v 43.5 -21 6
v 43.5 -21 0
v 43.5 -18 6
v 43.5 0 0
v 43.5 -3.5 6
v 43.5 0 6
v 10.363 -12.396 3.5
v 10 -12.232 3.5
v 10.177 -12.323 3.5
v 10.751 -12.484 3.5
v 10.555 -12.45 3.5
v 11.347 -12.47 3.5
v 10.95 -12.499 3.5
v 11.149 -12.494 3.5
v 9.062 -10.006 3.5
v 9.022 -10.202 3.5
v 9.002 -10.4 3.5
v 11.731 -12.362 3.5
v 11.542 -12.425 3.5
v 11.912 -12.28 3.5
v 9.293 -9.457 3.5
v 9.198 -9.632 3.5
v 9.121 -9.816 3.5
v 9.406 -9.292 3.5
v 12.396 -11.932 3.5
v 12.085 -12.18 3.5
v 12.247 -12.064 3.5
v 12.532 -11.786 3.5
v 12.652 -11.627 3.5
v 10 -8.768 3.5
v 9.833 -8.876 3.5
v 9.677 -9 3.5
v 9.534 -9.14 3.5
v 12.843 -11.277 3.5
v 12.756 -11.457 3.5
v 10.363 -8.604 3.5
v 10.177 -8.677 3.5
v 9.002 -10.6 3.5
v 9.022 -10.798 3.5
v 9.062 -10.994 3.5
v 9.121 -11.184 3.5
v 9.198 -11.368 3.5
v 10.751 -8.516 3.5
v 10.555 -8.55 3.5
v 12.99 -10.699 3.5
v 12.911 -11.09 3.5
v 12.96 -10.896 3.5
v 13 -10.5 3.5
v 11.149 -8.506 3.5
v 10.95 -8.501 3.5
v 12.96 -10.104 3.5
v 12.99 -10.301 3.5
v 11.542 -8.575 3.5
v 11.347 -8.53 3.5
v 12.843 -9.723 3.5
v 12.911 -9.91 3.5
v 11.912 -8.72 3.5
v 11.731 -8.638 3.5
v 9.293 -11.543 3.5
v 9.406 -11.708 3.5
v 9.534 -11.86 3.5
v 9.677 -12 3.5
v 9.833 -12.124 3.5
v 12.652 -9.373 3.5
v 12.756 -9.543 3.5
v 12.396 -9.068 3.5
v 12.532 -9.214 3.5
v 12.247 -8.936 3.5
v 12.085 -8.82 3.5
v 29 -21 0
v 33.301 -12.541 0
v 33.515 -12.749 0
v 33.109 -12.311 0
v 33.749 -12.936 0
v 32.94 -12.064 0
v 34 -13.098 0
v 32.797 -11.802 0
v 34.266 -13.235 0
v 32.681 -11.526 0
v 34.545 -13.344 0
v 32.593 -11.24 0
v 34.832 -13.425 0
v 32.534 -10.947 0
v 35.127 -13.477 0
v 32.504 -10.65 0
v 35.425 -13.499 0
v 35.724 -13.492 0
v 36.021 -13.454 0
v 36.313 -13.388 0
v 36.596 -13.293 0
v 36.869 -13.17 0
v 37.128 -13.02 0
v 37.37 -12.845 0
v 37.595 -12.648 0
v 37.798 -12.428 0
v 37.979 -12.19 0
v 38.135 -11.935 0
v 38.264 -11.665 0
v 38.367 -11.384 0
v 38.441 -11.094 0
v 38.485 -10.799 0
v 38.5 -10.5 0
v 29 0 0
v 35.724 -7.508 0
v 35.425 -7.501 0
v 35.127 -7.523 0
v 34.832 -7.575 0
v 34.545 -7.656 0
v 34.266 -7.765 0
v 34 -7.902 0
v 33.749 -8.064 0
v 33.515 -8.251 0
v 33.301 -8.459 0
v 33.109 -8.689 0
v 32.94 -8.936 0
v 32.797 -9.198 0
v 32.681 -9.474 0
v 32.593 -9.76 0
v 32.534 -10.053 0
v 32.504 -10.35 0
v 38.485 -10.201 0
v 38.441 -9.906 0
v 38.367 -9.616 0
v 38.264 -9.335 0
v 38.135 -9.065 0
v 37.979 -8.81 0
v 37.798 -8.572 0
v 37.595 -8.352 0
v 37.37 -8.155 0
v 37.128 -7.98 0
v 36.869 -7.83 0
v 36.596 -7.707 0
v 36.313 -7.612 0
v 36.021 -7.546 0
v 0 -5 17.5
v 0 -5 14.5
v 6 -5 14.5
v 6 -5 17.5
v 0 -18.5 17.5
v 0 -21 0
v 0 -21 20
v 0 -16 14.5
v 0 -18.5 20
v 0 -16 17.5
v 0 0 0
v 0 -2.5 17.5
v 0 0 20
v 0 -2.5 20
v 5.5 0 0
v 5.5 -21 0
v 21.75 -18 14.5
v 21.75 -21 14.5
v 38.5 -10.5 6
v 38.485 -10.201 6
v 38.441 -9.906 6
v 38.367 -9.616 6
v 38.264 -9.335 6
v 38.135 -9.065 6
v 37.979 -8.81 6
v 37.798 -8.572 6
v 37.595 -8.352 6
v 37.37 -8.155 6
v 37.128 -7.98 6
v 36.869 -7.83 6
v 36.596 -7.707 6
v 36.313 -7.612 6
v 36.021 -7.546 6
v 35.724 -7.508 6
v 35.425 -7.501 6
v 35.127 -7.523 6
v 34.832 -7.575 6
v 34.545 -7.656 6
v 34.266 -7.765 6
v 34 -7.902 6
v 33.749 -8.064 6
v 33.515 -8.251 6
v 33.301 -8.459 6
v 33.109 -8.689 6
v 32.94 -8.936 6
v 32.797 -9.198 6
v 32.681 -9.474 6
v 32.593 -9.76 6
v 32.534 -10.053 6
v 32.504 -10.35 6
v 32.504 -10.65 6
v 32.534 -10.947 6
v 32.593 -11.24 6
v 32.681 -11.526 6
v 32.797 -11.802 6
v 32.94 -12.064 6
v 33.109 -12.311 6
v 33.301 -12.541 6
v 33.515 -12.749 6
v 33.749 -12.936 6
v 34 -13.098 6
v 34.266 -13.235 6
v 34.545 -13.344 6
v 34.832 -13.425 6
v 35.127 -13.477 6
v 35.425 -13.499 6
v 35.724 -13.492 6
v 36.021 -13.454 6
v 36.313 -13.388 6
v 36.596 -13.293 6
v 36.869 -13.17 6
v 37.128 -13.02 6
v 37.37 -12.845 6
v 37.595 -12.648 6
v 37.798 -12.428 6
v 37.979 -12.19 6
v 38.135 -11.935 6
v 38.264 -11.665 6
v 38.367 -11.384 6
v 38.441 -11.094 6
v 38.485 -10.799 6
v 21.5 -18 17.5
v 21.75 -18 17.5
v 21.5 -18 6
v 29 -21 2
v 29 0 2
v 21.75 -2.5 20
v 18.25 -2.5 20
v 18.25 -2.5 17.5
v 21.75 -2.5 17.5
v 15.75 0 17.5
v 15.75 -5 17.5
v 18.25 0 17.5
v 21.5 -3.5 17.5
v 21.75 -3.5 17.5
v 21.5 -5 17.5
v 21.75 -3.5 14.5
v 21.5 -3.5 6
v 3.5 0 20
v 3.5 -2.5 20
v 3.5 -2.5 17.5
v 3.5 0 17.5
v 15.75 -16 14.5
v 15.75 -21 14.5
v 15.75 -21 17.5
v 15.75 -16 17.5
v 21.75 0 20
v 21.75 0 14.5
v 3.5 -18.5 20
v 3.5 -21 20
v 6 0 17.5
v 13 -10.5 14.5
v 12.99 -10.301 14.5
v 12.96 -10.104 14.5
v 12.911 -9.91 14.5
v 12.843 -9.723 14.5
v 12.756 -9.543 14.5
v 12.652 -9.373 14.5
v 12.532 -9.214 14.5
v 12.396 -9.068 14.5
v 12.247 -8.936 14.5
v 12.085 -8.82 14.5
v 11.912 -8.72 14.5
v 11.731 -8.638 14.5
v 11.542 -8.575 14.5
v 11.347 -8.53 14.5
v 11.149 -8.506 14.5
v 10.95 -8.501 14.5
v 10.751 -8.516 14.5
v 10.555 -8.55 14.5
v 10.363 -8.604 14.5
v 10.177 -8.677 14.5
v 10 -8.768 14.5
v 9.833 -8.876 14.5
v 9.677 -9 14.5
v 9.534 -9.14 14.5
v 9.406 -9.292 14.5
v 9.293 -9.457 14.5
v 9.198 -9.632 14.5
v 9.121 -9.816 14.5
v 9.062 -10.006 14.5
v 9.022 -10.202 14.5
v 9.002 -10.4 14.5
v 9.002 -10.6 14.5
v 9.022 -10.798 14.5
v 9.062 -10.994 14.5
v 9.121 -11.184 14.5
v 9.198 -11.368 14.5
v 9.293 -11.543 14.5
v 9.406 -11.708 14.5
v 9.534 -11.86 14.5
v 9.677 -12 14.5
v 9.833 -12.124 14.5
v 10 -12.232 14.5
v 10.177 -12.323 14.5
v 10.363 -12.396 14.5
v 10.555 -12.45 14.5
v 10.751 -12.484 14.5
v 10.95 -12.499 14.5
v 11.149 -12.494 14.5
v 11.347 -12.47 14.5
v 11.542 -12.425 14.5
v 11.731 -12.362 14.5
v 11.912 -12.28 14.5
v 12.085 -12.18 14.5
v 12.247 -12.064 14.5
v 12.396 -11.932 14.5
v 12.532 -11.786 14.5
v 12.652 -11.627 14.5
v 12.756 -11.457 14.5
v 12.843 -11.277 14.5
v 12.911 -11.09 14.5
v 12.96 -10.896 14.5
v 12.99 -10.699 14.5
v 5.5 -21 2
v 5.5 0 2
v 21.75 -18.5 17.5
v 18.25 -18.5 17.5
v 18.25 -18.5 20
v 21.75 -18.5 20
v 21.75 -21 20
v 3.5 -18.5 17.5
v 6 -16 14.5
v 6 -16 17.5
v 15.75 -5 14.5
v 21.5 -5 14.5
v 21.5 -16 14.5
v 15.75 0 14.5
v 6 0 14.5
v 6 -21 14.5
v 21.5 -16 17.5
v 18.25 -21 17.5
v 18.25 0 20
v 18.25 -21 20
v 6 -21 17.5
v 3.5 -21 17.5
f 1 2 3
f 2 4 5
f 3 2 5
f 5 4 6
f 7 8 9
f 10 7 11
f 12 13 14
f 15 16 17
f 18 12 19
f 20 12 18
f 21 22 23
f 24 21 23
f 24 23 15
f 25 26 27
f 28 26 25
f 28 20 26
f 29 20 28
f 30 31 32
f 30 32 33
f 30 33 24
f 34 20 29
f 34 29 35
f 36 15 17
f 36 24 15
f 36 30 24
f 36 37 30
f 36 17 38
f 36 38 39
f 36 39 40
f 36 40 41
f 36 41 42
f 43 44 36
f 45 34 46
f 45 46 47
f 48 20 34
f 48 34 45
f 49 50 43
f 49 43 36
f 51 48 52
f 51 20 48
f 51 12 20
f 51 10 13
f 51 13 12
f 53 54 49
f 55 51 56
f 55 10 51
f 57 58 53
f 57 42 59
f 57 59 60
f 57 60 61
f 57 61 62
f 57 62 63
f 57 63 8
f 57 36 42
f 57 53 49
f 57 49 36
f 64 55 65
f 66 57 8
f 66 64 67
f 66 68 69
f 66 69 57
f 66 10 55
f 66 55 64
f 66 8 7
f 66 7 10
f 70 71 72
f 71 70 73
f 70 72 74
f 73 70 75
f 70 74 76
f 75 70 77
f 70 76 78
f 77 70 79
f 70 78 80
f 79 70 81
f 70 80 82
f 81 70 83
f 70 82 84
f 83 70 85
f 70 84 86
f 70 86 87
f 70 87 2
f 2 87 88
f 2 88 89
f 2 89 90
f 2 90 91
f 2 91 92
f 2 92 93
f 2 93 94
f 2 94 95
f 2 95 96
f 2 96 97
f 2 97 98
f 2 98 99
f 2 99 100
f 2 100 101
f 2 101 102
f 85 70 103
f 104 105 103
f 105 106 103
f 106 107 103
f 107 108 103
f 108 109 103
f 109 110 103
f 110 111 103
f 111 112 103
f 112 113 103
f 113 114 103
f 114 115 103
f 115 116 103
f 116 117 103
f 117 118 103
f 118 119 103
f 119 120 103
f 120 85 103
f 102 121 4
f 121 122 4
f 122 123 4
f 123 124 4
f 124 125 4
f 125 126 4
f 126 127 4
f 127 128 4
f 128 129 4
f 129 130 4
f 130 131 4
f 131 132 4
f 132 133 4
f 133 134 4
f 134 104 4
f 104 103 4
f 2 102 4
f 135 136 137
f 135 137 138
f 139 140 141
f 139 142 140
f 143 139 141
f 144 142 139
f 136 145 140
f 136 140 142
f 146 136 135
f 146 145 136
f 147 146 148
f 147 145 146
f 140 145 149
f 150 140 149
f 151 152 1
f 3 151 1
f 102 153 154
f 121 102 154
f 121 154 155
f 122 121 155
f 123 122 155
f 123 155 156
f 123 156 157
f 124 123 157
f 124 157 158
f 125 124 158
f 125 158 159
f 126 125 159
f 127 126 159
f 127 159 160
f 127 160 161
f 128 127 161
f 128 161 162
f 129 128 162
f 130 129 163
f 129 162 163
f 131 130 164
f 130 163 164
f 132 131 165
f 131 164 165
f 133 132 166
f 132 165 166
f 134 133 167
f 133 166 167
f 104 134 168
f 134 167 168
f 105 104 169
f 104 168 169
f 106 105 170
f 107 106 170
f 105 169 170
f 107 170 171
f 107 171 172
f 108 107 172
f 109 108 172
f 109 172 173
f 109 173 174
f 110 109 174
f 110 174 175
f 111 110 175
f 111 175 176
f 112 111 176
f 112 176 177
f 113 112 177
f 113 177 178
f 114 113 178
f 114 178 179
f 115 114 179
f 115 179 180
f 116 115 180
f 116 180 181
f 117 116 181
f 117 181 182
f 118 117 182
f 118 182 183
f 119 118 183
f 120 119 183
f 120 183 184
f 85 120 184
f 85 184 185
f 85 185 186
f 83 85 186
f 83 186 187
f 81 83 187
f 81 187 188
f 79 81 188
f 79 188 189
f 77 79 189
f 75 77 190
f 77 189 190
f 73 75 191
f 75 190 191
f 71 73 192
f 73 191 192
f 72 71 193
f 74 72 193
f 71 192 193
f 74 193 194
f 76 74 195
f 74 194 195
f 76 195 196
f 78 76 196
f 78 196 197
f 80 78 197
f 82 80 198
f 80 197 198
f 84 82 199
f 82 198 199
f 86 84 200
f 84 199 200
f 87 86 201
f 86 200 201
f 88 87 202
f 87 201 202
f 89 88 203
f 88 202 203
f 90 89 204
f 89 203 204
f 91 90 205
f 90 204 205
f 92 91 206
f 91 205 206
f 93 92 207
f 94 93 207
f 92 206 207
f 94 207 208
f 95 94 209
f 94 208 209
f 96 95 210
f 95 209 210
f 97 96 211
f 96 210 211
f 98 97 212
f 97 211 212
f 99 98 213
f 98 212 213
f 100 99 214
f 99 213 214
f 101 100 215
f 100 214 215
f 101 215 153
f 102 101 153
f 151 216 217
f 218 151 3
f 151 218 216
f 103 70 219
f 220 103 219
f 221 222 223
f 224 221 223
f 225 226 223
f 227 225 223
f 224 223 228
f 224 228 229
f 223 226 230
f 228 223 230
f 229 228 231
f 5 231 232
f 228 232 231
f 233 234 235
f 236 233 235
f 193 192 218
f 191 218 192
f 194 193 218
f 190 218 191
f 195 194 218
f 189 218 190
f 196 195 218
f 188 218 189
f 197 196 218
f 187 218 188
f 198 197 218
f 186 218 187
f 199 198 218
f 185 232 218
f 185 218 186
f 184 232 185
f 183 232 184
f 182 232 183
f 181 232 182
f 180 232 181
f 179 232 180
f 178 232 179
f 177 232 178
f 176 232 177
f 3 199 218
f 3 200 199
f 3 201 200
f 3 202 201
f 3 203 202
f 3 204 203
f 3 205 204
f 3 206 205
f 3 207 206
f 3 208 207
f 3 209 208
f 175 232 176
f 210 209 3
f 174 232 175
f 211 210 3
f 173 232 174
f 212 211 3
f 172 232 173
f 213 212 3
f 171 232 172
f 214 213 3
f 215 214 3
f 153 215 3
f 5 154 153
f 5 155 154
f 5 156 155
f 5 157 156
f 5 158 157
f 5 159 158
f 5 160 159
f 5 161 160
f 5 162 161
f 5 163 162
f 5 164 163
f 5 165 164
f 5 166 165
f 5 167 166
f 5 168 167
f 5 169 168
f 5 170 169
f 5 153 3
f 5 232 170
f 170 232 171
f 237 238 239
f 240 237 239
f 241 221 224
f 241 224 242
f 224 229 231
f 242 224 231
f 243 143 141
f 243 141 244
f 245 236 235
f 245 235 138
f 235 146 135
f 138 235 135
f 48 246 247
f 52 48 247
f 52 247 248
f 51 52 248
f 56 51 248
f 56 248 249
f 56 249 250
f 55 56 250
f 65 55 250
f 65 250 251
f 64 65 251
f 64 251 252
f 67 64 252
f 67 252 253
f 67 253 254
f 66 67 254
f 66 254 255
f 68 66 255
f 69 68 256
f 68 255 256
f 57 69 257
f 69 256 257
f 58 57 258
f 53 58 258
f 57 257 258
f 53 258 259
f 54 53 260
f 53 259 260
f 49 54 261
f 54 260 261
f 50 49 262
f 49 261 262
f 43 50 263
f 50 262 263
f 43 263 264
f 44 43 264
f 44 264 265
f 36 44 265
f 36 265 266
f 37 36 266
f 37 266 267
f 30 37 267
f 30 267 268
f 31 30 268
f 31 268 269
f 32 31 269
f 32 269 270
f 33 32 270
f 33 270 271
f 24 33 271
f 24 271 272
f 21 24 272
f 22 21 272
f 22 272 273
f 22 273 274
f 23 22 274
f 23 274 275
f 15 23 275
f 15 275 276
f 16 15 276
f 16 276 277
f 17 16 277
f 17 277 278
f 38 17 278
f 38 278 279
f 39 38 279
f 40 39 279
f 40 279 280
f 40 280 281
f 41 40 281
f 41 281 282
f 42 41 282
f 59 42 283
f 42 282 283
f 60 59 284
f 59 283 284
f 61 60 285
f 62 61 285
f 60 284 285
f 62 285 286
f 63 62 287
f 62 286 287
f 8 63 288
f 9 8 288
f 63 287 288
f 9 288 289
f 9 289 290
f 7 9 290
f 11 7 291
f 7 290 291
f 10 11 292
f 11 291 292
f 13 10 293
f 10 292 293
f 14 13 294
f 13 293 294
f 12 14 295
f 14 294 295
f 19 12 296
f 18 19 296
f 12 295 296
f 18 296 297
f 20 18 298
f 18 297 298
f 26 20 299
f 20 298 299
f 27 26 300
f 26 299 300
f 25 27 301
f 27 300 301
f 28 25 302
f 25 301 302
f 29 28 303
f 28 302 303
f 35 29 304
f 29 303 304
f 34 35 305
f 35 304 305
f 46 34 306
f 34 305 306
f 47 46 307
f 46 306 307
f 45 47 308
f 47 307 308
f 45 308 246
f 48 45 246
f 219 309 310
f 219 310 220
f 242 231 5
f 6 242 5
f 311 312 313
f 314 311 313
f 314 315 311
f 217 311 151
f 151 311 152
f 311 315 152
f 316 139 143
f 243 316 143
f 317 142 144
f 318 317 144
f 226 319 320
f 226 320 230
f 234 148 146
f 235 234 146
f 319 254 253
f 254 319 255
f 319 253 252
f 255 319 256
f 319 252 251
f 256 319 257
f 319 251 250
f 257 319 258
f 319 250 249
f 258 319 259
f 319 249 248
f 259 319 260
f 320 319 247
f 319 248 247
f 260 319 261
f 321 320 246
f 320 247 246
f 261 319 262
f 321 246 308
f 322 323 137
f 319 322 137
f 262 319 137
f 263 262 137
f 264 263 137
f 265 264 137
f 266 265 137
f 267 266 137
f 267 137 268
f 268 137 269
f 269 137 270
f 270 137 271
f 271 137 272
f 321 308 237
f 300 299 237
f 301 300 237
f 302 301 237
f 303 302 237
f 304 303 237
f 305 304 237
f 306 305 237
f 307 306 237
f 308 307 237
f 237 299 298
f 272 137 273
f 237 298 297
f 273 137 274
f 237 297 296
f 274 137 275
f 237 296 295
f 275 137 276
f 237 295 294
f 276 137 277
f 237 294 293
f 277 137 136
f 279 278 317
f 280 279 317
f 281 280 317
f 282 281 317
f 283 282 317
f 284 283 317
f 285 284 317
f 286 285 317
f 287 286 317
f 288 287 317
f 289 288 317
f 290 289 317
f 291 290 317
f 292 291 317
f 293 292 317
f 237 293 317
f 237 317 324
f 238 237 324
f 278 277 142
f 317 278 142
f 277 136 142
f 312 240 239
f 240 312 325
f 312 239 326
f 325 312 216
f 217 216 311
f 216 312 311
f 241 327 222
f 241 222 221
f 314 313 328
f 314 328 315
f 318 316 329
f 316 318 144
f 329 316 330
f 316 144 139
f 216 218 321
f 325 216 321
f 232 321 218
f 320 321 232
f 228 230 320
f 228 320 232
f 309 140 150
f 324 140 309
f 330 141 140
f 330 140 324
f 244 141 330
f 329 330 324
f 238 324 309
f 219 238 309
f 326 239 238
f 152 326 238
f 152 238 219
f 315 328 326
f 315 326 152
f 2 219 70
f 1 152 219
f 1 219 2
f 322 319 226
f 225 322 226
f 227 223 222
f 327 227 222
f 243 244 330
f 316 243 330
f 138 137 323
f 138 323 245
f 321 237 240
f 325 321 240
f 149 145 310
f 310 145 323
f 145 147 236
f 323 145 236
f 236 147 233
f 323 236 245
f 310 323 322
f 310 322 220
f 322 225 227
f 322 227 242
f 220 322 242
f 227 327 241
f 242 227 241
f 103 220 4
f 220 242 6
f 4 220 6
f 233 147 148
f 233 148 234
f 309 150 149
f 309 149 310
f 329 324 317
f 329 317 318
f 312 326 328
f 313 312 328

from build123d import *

# Parameters (mm, degrees)
F0_W      = 43.5
F0_H      = 20
F1_DEPTH  = 21
F3_R      = 3
F4_DEPTH  = 20.001
F2_R      = 2
F5_DEPTH  = 16.5
F6_W      = 22
F6_H      = 14.5
F6_R      = 3
F7_DEPTH  = 14
F11_DEPTH = 21.001
F12_W     = 9.75
F12_H     = 3
F12_W_2   = 23.5
F12_H_2   = 2
F13_DEPTH = 21.001
F14_W     = 11
F14_H     = 3
F15_DEPTH = 43.501


with BuildPart() as f1:
    # F0 (on Front) → F1 (new body)
    with BuildSketch(Plane.XZ):
        with Locations((21.75, 10)):
            Rectangle(F0_W, F0_H)
    extrude(amount=F1_DEPTH)

    # F3 (on face) → F4 (cut, through all)
    with BuildSketch(Plane.XY.offset(20)):
        with Locations((35.5, -10.5)):
            Circle(F3_R)
    extrude(amount=-F4_DEPTH, mode=Mode.SUBTRACT)

    # F2 (on face) → F5 (cut)
    with BuildSketch(Plane.XY.offset(20)):
        with Locations((11, -10.5)):
            Circle(F2_R)
    extrude(amount=-F5_DEPTH, mode=Mode.SUBTRACT)

    # F6 (on face) → F7 (cut)
    with BuildSketch(Plane.XY.offset(20)):
        with Locations((32.5, -10.75)):
            Rectangle(F6_W, F6_H)
        with Locations((35.5, -10.5)):
            Circle(F6_R, mode=Mode.SUBTRACT)
    extrude(amount=-F7_DEPTH, mode=Mode.SUBTRACT)

    # F10 (on face) → F11 (cut, through all)
    with BuildSketch(Plane.XZ.offset(21)):
        Polygon((43.5, 6), (43.5, 20), (21.75, 20), (21.75, 14.5), align=None)
    extrude(amount=-F11_DEPTH, mode=Mode.SUBTRACT)

    # F12 (on face) → F13 (cut, through all)
    with BuildSketch(Plane.XZ.offset(21)):
        with Locations((10.875, 16)):
            Rectangle(F12_W, F12_H)
        Polygon((18.25, 20), (3.5, 20), (3.5, 17.5), (6, 17.5), (15.75, 17.5), (18.25, 17.5), align=None)
        with Locations((17.25, 1)):
            Rectangle(F12_W_2, F12_H_2)
    extrude(amount=-F13_DEPTH, mode=Mode.SUBTRACT)

    # F14 (on face) → F15 (cut, through all)
    with BuildSketch(Plane(origin=(0, 0, 0), x_dir=(0, -1, 0), z_dir=(-1, 0, 0))):
        Polygon((18.5, 20), (2.5, 20), (2.5, 17.5), (5, 17.5), (16, 17.5), (18.5, 17.5), align=None)
        with Locations((10.5, 16)):
            Rectangle(F14_W, F14_H)
    extrude(amount=-F15_DEPTH, mode=Mode.SUBTRACT)


solid = f1.part
